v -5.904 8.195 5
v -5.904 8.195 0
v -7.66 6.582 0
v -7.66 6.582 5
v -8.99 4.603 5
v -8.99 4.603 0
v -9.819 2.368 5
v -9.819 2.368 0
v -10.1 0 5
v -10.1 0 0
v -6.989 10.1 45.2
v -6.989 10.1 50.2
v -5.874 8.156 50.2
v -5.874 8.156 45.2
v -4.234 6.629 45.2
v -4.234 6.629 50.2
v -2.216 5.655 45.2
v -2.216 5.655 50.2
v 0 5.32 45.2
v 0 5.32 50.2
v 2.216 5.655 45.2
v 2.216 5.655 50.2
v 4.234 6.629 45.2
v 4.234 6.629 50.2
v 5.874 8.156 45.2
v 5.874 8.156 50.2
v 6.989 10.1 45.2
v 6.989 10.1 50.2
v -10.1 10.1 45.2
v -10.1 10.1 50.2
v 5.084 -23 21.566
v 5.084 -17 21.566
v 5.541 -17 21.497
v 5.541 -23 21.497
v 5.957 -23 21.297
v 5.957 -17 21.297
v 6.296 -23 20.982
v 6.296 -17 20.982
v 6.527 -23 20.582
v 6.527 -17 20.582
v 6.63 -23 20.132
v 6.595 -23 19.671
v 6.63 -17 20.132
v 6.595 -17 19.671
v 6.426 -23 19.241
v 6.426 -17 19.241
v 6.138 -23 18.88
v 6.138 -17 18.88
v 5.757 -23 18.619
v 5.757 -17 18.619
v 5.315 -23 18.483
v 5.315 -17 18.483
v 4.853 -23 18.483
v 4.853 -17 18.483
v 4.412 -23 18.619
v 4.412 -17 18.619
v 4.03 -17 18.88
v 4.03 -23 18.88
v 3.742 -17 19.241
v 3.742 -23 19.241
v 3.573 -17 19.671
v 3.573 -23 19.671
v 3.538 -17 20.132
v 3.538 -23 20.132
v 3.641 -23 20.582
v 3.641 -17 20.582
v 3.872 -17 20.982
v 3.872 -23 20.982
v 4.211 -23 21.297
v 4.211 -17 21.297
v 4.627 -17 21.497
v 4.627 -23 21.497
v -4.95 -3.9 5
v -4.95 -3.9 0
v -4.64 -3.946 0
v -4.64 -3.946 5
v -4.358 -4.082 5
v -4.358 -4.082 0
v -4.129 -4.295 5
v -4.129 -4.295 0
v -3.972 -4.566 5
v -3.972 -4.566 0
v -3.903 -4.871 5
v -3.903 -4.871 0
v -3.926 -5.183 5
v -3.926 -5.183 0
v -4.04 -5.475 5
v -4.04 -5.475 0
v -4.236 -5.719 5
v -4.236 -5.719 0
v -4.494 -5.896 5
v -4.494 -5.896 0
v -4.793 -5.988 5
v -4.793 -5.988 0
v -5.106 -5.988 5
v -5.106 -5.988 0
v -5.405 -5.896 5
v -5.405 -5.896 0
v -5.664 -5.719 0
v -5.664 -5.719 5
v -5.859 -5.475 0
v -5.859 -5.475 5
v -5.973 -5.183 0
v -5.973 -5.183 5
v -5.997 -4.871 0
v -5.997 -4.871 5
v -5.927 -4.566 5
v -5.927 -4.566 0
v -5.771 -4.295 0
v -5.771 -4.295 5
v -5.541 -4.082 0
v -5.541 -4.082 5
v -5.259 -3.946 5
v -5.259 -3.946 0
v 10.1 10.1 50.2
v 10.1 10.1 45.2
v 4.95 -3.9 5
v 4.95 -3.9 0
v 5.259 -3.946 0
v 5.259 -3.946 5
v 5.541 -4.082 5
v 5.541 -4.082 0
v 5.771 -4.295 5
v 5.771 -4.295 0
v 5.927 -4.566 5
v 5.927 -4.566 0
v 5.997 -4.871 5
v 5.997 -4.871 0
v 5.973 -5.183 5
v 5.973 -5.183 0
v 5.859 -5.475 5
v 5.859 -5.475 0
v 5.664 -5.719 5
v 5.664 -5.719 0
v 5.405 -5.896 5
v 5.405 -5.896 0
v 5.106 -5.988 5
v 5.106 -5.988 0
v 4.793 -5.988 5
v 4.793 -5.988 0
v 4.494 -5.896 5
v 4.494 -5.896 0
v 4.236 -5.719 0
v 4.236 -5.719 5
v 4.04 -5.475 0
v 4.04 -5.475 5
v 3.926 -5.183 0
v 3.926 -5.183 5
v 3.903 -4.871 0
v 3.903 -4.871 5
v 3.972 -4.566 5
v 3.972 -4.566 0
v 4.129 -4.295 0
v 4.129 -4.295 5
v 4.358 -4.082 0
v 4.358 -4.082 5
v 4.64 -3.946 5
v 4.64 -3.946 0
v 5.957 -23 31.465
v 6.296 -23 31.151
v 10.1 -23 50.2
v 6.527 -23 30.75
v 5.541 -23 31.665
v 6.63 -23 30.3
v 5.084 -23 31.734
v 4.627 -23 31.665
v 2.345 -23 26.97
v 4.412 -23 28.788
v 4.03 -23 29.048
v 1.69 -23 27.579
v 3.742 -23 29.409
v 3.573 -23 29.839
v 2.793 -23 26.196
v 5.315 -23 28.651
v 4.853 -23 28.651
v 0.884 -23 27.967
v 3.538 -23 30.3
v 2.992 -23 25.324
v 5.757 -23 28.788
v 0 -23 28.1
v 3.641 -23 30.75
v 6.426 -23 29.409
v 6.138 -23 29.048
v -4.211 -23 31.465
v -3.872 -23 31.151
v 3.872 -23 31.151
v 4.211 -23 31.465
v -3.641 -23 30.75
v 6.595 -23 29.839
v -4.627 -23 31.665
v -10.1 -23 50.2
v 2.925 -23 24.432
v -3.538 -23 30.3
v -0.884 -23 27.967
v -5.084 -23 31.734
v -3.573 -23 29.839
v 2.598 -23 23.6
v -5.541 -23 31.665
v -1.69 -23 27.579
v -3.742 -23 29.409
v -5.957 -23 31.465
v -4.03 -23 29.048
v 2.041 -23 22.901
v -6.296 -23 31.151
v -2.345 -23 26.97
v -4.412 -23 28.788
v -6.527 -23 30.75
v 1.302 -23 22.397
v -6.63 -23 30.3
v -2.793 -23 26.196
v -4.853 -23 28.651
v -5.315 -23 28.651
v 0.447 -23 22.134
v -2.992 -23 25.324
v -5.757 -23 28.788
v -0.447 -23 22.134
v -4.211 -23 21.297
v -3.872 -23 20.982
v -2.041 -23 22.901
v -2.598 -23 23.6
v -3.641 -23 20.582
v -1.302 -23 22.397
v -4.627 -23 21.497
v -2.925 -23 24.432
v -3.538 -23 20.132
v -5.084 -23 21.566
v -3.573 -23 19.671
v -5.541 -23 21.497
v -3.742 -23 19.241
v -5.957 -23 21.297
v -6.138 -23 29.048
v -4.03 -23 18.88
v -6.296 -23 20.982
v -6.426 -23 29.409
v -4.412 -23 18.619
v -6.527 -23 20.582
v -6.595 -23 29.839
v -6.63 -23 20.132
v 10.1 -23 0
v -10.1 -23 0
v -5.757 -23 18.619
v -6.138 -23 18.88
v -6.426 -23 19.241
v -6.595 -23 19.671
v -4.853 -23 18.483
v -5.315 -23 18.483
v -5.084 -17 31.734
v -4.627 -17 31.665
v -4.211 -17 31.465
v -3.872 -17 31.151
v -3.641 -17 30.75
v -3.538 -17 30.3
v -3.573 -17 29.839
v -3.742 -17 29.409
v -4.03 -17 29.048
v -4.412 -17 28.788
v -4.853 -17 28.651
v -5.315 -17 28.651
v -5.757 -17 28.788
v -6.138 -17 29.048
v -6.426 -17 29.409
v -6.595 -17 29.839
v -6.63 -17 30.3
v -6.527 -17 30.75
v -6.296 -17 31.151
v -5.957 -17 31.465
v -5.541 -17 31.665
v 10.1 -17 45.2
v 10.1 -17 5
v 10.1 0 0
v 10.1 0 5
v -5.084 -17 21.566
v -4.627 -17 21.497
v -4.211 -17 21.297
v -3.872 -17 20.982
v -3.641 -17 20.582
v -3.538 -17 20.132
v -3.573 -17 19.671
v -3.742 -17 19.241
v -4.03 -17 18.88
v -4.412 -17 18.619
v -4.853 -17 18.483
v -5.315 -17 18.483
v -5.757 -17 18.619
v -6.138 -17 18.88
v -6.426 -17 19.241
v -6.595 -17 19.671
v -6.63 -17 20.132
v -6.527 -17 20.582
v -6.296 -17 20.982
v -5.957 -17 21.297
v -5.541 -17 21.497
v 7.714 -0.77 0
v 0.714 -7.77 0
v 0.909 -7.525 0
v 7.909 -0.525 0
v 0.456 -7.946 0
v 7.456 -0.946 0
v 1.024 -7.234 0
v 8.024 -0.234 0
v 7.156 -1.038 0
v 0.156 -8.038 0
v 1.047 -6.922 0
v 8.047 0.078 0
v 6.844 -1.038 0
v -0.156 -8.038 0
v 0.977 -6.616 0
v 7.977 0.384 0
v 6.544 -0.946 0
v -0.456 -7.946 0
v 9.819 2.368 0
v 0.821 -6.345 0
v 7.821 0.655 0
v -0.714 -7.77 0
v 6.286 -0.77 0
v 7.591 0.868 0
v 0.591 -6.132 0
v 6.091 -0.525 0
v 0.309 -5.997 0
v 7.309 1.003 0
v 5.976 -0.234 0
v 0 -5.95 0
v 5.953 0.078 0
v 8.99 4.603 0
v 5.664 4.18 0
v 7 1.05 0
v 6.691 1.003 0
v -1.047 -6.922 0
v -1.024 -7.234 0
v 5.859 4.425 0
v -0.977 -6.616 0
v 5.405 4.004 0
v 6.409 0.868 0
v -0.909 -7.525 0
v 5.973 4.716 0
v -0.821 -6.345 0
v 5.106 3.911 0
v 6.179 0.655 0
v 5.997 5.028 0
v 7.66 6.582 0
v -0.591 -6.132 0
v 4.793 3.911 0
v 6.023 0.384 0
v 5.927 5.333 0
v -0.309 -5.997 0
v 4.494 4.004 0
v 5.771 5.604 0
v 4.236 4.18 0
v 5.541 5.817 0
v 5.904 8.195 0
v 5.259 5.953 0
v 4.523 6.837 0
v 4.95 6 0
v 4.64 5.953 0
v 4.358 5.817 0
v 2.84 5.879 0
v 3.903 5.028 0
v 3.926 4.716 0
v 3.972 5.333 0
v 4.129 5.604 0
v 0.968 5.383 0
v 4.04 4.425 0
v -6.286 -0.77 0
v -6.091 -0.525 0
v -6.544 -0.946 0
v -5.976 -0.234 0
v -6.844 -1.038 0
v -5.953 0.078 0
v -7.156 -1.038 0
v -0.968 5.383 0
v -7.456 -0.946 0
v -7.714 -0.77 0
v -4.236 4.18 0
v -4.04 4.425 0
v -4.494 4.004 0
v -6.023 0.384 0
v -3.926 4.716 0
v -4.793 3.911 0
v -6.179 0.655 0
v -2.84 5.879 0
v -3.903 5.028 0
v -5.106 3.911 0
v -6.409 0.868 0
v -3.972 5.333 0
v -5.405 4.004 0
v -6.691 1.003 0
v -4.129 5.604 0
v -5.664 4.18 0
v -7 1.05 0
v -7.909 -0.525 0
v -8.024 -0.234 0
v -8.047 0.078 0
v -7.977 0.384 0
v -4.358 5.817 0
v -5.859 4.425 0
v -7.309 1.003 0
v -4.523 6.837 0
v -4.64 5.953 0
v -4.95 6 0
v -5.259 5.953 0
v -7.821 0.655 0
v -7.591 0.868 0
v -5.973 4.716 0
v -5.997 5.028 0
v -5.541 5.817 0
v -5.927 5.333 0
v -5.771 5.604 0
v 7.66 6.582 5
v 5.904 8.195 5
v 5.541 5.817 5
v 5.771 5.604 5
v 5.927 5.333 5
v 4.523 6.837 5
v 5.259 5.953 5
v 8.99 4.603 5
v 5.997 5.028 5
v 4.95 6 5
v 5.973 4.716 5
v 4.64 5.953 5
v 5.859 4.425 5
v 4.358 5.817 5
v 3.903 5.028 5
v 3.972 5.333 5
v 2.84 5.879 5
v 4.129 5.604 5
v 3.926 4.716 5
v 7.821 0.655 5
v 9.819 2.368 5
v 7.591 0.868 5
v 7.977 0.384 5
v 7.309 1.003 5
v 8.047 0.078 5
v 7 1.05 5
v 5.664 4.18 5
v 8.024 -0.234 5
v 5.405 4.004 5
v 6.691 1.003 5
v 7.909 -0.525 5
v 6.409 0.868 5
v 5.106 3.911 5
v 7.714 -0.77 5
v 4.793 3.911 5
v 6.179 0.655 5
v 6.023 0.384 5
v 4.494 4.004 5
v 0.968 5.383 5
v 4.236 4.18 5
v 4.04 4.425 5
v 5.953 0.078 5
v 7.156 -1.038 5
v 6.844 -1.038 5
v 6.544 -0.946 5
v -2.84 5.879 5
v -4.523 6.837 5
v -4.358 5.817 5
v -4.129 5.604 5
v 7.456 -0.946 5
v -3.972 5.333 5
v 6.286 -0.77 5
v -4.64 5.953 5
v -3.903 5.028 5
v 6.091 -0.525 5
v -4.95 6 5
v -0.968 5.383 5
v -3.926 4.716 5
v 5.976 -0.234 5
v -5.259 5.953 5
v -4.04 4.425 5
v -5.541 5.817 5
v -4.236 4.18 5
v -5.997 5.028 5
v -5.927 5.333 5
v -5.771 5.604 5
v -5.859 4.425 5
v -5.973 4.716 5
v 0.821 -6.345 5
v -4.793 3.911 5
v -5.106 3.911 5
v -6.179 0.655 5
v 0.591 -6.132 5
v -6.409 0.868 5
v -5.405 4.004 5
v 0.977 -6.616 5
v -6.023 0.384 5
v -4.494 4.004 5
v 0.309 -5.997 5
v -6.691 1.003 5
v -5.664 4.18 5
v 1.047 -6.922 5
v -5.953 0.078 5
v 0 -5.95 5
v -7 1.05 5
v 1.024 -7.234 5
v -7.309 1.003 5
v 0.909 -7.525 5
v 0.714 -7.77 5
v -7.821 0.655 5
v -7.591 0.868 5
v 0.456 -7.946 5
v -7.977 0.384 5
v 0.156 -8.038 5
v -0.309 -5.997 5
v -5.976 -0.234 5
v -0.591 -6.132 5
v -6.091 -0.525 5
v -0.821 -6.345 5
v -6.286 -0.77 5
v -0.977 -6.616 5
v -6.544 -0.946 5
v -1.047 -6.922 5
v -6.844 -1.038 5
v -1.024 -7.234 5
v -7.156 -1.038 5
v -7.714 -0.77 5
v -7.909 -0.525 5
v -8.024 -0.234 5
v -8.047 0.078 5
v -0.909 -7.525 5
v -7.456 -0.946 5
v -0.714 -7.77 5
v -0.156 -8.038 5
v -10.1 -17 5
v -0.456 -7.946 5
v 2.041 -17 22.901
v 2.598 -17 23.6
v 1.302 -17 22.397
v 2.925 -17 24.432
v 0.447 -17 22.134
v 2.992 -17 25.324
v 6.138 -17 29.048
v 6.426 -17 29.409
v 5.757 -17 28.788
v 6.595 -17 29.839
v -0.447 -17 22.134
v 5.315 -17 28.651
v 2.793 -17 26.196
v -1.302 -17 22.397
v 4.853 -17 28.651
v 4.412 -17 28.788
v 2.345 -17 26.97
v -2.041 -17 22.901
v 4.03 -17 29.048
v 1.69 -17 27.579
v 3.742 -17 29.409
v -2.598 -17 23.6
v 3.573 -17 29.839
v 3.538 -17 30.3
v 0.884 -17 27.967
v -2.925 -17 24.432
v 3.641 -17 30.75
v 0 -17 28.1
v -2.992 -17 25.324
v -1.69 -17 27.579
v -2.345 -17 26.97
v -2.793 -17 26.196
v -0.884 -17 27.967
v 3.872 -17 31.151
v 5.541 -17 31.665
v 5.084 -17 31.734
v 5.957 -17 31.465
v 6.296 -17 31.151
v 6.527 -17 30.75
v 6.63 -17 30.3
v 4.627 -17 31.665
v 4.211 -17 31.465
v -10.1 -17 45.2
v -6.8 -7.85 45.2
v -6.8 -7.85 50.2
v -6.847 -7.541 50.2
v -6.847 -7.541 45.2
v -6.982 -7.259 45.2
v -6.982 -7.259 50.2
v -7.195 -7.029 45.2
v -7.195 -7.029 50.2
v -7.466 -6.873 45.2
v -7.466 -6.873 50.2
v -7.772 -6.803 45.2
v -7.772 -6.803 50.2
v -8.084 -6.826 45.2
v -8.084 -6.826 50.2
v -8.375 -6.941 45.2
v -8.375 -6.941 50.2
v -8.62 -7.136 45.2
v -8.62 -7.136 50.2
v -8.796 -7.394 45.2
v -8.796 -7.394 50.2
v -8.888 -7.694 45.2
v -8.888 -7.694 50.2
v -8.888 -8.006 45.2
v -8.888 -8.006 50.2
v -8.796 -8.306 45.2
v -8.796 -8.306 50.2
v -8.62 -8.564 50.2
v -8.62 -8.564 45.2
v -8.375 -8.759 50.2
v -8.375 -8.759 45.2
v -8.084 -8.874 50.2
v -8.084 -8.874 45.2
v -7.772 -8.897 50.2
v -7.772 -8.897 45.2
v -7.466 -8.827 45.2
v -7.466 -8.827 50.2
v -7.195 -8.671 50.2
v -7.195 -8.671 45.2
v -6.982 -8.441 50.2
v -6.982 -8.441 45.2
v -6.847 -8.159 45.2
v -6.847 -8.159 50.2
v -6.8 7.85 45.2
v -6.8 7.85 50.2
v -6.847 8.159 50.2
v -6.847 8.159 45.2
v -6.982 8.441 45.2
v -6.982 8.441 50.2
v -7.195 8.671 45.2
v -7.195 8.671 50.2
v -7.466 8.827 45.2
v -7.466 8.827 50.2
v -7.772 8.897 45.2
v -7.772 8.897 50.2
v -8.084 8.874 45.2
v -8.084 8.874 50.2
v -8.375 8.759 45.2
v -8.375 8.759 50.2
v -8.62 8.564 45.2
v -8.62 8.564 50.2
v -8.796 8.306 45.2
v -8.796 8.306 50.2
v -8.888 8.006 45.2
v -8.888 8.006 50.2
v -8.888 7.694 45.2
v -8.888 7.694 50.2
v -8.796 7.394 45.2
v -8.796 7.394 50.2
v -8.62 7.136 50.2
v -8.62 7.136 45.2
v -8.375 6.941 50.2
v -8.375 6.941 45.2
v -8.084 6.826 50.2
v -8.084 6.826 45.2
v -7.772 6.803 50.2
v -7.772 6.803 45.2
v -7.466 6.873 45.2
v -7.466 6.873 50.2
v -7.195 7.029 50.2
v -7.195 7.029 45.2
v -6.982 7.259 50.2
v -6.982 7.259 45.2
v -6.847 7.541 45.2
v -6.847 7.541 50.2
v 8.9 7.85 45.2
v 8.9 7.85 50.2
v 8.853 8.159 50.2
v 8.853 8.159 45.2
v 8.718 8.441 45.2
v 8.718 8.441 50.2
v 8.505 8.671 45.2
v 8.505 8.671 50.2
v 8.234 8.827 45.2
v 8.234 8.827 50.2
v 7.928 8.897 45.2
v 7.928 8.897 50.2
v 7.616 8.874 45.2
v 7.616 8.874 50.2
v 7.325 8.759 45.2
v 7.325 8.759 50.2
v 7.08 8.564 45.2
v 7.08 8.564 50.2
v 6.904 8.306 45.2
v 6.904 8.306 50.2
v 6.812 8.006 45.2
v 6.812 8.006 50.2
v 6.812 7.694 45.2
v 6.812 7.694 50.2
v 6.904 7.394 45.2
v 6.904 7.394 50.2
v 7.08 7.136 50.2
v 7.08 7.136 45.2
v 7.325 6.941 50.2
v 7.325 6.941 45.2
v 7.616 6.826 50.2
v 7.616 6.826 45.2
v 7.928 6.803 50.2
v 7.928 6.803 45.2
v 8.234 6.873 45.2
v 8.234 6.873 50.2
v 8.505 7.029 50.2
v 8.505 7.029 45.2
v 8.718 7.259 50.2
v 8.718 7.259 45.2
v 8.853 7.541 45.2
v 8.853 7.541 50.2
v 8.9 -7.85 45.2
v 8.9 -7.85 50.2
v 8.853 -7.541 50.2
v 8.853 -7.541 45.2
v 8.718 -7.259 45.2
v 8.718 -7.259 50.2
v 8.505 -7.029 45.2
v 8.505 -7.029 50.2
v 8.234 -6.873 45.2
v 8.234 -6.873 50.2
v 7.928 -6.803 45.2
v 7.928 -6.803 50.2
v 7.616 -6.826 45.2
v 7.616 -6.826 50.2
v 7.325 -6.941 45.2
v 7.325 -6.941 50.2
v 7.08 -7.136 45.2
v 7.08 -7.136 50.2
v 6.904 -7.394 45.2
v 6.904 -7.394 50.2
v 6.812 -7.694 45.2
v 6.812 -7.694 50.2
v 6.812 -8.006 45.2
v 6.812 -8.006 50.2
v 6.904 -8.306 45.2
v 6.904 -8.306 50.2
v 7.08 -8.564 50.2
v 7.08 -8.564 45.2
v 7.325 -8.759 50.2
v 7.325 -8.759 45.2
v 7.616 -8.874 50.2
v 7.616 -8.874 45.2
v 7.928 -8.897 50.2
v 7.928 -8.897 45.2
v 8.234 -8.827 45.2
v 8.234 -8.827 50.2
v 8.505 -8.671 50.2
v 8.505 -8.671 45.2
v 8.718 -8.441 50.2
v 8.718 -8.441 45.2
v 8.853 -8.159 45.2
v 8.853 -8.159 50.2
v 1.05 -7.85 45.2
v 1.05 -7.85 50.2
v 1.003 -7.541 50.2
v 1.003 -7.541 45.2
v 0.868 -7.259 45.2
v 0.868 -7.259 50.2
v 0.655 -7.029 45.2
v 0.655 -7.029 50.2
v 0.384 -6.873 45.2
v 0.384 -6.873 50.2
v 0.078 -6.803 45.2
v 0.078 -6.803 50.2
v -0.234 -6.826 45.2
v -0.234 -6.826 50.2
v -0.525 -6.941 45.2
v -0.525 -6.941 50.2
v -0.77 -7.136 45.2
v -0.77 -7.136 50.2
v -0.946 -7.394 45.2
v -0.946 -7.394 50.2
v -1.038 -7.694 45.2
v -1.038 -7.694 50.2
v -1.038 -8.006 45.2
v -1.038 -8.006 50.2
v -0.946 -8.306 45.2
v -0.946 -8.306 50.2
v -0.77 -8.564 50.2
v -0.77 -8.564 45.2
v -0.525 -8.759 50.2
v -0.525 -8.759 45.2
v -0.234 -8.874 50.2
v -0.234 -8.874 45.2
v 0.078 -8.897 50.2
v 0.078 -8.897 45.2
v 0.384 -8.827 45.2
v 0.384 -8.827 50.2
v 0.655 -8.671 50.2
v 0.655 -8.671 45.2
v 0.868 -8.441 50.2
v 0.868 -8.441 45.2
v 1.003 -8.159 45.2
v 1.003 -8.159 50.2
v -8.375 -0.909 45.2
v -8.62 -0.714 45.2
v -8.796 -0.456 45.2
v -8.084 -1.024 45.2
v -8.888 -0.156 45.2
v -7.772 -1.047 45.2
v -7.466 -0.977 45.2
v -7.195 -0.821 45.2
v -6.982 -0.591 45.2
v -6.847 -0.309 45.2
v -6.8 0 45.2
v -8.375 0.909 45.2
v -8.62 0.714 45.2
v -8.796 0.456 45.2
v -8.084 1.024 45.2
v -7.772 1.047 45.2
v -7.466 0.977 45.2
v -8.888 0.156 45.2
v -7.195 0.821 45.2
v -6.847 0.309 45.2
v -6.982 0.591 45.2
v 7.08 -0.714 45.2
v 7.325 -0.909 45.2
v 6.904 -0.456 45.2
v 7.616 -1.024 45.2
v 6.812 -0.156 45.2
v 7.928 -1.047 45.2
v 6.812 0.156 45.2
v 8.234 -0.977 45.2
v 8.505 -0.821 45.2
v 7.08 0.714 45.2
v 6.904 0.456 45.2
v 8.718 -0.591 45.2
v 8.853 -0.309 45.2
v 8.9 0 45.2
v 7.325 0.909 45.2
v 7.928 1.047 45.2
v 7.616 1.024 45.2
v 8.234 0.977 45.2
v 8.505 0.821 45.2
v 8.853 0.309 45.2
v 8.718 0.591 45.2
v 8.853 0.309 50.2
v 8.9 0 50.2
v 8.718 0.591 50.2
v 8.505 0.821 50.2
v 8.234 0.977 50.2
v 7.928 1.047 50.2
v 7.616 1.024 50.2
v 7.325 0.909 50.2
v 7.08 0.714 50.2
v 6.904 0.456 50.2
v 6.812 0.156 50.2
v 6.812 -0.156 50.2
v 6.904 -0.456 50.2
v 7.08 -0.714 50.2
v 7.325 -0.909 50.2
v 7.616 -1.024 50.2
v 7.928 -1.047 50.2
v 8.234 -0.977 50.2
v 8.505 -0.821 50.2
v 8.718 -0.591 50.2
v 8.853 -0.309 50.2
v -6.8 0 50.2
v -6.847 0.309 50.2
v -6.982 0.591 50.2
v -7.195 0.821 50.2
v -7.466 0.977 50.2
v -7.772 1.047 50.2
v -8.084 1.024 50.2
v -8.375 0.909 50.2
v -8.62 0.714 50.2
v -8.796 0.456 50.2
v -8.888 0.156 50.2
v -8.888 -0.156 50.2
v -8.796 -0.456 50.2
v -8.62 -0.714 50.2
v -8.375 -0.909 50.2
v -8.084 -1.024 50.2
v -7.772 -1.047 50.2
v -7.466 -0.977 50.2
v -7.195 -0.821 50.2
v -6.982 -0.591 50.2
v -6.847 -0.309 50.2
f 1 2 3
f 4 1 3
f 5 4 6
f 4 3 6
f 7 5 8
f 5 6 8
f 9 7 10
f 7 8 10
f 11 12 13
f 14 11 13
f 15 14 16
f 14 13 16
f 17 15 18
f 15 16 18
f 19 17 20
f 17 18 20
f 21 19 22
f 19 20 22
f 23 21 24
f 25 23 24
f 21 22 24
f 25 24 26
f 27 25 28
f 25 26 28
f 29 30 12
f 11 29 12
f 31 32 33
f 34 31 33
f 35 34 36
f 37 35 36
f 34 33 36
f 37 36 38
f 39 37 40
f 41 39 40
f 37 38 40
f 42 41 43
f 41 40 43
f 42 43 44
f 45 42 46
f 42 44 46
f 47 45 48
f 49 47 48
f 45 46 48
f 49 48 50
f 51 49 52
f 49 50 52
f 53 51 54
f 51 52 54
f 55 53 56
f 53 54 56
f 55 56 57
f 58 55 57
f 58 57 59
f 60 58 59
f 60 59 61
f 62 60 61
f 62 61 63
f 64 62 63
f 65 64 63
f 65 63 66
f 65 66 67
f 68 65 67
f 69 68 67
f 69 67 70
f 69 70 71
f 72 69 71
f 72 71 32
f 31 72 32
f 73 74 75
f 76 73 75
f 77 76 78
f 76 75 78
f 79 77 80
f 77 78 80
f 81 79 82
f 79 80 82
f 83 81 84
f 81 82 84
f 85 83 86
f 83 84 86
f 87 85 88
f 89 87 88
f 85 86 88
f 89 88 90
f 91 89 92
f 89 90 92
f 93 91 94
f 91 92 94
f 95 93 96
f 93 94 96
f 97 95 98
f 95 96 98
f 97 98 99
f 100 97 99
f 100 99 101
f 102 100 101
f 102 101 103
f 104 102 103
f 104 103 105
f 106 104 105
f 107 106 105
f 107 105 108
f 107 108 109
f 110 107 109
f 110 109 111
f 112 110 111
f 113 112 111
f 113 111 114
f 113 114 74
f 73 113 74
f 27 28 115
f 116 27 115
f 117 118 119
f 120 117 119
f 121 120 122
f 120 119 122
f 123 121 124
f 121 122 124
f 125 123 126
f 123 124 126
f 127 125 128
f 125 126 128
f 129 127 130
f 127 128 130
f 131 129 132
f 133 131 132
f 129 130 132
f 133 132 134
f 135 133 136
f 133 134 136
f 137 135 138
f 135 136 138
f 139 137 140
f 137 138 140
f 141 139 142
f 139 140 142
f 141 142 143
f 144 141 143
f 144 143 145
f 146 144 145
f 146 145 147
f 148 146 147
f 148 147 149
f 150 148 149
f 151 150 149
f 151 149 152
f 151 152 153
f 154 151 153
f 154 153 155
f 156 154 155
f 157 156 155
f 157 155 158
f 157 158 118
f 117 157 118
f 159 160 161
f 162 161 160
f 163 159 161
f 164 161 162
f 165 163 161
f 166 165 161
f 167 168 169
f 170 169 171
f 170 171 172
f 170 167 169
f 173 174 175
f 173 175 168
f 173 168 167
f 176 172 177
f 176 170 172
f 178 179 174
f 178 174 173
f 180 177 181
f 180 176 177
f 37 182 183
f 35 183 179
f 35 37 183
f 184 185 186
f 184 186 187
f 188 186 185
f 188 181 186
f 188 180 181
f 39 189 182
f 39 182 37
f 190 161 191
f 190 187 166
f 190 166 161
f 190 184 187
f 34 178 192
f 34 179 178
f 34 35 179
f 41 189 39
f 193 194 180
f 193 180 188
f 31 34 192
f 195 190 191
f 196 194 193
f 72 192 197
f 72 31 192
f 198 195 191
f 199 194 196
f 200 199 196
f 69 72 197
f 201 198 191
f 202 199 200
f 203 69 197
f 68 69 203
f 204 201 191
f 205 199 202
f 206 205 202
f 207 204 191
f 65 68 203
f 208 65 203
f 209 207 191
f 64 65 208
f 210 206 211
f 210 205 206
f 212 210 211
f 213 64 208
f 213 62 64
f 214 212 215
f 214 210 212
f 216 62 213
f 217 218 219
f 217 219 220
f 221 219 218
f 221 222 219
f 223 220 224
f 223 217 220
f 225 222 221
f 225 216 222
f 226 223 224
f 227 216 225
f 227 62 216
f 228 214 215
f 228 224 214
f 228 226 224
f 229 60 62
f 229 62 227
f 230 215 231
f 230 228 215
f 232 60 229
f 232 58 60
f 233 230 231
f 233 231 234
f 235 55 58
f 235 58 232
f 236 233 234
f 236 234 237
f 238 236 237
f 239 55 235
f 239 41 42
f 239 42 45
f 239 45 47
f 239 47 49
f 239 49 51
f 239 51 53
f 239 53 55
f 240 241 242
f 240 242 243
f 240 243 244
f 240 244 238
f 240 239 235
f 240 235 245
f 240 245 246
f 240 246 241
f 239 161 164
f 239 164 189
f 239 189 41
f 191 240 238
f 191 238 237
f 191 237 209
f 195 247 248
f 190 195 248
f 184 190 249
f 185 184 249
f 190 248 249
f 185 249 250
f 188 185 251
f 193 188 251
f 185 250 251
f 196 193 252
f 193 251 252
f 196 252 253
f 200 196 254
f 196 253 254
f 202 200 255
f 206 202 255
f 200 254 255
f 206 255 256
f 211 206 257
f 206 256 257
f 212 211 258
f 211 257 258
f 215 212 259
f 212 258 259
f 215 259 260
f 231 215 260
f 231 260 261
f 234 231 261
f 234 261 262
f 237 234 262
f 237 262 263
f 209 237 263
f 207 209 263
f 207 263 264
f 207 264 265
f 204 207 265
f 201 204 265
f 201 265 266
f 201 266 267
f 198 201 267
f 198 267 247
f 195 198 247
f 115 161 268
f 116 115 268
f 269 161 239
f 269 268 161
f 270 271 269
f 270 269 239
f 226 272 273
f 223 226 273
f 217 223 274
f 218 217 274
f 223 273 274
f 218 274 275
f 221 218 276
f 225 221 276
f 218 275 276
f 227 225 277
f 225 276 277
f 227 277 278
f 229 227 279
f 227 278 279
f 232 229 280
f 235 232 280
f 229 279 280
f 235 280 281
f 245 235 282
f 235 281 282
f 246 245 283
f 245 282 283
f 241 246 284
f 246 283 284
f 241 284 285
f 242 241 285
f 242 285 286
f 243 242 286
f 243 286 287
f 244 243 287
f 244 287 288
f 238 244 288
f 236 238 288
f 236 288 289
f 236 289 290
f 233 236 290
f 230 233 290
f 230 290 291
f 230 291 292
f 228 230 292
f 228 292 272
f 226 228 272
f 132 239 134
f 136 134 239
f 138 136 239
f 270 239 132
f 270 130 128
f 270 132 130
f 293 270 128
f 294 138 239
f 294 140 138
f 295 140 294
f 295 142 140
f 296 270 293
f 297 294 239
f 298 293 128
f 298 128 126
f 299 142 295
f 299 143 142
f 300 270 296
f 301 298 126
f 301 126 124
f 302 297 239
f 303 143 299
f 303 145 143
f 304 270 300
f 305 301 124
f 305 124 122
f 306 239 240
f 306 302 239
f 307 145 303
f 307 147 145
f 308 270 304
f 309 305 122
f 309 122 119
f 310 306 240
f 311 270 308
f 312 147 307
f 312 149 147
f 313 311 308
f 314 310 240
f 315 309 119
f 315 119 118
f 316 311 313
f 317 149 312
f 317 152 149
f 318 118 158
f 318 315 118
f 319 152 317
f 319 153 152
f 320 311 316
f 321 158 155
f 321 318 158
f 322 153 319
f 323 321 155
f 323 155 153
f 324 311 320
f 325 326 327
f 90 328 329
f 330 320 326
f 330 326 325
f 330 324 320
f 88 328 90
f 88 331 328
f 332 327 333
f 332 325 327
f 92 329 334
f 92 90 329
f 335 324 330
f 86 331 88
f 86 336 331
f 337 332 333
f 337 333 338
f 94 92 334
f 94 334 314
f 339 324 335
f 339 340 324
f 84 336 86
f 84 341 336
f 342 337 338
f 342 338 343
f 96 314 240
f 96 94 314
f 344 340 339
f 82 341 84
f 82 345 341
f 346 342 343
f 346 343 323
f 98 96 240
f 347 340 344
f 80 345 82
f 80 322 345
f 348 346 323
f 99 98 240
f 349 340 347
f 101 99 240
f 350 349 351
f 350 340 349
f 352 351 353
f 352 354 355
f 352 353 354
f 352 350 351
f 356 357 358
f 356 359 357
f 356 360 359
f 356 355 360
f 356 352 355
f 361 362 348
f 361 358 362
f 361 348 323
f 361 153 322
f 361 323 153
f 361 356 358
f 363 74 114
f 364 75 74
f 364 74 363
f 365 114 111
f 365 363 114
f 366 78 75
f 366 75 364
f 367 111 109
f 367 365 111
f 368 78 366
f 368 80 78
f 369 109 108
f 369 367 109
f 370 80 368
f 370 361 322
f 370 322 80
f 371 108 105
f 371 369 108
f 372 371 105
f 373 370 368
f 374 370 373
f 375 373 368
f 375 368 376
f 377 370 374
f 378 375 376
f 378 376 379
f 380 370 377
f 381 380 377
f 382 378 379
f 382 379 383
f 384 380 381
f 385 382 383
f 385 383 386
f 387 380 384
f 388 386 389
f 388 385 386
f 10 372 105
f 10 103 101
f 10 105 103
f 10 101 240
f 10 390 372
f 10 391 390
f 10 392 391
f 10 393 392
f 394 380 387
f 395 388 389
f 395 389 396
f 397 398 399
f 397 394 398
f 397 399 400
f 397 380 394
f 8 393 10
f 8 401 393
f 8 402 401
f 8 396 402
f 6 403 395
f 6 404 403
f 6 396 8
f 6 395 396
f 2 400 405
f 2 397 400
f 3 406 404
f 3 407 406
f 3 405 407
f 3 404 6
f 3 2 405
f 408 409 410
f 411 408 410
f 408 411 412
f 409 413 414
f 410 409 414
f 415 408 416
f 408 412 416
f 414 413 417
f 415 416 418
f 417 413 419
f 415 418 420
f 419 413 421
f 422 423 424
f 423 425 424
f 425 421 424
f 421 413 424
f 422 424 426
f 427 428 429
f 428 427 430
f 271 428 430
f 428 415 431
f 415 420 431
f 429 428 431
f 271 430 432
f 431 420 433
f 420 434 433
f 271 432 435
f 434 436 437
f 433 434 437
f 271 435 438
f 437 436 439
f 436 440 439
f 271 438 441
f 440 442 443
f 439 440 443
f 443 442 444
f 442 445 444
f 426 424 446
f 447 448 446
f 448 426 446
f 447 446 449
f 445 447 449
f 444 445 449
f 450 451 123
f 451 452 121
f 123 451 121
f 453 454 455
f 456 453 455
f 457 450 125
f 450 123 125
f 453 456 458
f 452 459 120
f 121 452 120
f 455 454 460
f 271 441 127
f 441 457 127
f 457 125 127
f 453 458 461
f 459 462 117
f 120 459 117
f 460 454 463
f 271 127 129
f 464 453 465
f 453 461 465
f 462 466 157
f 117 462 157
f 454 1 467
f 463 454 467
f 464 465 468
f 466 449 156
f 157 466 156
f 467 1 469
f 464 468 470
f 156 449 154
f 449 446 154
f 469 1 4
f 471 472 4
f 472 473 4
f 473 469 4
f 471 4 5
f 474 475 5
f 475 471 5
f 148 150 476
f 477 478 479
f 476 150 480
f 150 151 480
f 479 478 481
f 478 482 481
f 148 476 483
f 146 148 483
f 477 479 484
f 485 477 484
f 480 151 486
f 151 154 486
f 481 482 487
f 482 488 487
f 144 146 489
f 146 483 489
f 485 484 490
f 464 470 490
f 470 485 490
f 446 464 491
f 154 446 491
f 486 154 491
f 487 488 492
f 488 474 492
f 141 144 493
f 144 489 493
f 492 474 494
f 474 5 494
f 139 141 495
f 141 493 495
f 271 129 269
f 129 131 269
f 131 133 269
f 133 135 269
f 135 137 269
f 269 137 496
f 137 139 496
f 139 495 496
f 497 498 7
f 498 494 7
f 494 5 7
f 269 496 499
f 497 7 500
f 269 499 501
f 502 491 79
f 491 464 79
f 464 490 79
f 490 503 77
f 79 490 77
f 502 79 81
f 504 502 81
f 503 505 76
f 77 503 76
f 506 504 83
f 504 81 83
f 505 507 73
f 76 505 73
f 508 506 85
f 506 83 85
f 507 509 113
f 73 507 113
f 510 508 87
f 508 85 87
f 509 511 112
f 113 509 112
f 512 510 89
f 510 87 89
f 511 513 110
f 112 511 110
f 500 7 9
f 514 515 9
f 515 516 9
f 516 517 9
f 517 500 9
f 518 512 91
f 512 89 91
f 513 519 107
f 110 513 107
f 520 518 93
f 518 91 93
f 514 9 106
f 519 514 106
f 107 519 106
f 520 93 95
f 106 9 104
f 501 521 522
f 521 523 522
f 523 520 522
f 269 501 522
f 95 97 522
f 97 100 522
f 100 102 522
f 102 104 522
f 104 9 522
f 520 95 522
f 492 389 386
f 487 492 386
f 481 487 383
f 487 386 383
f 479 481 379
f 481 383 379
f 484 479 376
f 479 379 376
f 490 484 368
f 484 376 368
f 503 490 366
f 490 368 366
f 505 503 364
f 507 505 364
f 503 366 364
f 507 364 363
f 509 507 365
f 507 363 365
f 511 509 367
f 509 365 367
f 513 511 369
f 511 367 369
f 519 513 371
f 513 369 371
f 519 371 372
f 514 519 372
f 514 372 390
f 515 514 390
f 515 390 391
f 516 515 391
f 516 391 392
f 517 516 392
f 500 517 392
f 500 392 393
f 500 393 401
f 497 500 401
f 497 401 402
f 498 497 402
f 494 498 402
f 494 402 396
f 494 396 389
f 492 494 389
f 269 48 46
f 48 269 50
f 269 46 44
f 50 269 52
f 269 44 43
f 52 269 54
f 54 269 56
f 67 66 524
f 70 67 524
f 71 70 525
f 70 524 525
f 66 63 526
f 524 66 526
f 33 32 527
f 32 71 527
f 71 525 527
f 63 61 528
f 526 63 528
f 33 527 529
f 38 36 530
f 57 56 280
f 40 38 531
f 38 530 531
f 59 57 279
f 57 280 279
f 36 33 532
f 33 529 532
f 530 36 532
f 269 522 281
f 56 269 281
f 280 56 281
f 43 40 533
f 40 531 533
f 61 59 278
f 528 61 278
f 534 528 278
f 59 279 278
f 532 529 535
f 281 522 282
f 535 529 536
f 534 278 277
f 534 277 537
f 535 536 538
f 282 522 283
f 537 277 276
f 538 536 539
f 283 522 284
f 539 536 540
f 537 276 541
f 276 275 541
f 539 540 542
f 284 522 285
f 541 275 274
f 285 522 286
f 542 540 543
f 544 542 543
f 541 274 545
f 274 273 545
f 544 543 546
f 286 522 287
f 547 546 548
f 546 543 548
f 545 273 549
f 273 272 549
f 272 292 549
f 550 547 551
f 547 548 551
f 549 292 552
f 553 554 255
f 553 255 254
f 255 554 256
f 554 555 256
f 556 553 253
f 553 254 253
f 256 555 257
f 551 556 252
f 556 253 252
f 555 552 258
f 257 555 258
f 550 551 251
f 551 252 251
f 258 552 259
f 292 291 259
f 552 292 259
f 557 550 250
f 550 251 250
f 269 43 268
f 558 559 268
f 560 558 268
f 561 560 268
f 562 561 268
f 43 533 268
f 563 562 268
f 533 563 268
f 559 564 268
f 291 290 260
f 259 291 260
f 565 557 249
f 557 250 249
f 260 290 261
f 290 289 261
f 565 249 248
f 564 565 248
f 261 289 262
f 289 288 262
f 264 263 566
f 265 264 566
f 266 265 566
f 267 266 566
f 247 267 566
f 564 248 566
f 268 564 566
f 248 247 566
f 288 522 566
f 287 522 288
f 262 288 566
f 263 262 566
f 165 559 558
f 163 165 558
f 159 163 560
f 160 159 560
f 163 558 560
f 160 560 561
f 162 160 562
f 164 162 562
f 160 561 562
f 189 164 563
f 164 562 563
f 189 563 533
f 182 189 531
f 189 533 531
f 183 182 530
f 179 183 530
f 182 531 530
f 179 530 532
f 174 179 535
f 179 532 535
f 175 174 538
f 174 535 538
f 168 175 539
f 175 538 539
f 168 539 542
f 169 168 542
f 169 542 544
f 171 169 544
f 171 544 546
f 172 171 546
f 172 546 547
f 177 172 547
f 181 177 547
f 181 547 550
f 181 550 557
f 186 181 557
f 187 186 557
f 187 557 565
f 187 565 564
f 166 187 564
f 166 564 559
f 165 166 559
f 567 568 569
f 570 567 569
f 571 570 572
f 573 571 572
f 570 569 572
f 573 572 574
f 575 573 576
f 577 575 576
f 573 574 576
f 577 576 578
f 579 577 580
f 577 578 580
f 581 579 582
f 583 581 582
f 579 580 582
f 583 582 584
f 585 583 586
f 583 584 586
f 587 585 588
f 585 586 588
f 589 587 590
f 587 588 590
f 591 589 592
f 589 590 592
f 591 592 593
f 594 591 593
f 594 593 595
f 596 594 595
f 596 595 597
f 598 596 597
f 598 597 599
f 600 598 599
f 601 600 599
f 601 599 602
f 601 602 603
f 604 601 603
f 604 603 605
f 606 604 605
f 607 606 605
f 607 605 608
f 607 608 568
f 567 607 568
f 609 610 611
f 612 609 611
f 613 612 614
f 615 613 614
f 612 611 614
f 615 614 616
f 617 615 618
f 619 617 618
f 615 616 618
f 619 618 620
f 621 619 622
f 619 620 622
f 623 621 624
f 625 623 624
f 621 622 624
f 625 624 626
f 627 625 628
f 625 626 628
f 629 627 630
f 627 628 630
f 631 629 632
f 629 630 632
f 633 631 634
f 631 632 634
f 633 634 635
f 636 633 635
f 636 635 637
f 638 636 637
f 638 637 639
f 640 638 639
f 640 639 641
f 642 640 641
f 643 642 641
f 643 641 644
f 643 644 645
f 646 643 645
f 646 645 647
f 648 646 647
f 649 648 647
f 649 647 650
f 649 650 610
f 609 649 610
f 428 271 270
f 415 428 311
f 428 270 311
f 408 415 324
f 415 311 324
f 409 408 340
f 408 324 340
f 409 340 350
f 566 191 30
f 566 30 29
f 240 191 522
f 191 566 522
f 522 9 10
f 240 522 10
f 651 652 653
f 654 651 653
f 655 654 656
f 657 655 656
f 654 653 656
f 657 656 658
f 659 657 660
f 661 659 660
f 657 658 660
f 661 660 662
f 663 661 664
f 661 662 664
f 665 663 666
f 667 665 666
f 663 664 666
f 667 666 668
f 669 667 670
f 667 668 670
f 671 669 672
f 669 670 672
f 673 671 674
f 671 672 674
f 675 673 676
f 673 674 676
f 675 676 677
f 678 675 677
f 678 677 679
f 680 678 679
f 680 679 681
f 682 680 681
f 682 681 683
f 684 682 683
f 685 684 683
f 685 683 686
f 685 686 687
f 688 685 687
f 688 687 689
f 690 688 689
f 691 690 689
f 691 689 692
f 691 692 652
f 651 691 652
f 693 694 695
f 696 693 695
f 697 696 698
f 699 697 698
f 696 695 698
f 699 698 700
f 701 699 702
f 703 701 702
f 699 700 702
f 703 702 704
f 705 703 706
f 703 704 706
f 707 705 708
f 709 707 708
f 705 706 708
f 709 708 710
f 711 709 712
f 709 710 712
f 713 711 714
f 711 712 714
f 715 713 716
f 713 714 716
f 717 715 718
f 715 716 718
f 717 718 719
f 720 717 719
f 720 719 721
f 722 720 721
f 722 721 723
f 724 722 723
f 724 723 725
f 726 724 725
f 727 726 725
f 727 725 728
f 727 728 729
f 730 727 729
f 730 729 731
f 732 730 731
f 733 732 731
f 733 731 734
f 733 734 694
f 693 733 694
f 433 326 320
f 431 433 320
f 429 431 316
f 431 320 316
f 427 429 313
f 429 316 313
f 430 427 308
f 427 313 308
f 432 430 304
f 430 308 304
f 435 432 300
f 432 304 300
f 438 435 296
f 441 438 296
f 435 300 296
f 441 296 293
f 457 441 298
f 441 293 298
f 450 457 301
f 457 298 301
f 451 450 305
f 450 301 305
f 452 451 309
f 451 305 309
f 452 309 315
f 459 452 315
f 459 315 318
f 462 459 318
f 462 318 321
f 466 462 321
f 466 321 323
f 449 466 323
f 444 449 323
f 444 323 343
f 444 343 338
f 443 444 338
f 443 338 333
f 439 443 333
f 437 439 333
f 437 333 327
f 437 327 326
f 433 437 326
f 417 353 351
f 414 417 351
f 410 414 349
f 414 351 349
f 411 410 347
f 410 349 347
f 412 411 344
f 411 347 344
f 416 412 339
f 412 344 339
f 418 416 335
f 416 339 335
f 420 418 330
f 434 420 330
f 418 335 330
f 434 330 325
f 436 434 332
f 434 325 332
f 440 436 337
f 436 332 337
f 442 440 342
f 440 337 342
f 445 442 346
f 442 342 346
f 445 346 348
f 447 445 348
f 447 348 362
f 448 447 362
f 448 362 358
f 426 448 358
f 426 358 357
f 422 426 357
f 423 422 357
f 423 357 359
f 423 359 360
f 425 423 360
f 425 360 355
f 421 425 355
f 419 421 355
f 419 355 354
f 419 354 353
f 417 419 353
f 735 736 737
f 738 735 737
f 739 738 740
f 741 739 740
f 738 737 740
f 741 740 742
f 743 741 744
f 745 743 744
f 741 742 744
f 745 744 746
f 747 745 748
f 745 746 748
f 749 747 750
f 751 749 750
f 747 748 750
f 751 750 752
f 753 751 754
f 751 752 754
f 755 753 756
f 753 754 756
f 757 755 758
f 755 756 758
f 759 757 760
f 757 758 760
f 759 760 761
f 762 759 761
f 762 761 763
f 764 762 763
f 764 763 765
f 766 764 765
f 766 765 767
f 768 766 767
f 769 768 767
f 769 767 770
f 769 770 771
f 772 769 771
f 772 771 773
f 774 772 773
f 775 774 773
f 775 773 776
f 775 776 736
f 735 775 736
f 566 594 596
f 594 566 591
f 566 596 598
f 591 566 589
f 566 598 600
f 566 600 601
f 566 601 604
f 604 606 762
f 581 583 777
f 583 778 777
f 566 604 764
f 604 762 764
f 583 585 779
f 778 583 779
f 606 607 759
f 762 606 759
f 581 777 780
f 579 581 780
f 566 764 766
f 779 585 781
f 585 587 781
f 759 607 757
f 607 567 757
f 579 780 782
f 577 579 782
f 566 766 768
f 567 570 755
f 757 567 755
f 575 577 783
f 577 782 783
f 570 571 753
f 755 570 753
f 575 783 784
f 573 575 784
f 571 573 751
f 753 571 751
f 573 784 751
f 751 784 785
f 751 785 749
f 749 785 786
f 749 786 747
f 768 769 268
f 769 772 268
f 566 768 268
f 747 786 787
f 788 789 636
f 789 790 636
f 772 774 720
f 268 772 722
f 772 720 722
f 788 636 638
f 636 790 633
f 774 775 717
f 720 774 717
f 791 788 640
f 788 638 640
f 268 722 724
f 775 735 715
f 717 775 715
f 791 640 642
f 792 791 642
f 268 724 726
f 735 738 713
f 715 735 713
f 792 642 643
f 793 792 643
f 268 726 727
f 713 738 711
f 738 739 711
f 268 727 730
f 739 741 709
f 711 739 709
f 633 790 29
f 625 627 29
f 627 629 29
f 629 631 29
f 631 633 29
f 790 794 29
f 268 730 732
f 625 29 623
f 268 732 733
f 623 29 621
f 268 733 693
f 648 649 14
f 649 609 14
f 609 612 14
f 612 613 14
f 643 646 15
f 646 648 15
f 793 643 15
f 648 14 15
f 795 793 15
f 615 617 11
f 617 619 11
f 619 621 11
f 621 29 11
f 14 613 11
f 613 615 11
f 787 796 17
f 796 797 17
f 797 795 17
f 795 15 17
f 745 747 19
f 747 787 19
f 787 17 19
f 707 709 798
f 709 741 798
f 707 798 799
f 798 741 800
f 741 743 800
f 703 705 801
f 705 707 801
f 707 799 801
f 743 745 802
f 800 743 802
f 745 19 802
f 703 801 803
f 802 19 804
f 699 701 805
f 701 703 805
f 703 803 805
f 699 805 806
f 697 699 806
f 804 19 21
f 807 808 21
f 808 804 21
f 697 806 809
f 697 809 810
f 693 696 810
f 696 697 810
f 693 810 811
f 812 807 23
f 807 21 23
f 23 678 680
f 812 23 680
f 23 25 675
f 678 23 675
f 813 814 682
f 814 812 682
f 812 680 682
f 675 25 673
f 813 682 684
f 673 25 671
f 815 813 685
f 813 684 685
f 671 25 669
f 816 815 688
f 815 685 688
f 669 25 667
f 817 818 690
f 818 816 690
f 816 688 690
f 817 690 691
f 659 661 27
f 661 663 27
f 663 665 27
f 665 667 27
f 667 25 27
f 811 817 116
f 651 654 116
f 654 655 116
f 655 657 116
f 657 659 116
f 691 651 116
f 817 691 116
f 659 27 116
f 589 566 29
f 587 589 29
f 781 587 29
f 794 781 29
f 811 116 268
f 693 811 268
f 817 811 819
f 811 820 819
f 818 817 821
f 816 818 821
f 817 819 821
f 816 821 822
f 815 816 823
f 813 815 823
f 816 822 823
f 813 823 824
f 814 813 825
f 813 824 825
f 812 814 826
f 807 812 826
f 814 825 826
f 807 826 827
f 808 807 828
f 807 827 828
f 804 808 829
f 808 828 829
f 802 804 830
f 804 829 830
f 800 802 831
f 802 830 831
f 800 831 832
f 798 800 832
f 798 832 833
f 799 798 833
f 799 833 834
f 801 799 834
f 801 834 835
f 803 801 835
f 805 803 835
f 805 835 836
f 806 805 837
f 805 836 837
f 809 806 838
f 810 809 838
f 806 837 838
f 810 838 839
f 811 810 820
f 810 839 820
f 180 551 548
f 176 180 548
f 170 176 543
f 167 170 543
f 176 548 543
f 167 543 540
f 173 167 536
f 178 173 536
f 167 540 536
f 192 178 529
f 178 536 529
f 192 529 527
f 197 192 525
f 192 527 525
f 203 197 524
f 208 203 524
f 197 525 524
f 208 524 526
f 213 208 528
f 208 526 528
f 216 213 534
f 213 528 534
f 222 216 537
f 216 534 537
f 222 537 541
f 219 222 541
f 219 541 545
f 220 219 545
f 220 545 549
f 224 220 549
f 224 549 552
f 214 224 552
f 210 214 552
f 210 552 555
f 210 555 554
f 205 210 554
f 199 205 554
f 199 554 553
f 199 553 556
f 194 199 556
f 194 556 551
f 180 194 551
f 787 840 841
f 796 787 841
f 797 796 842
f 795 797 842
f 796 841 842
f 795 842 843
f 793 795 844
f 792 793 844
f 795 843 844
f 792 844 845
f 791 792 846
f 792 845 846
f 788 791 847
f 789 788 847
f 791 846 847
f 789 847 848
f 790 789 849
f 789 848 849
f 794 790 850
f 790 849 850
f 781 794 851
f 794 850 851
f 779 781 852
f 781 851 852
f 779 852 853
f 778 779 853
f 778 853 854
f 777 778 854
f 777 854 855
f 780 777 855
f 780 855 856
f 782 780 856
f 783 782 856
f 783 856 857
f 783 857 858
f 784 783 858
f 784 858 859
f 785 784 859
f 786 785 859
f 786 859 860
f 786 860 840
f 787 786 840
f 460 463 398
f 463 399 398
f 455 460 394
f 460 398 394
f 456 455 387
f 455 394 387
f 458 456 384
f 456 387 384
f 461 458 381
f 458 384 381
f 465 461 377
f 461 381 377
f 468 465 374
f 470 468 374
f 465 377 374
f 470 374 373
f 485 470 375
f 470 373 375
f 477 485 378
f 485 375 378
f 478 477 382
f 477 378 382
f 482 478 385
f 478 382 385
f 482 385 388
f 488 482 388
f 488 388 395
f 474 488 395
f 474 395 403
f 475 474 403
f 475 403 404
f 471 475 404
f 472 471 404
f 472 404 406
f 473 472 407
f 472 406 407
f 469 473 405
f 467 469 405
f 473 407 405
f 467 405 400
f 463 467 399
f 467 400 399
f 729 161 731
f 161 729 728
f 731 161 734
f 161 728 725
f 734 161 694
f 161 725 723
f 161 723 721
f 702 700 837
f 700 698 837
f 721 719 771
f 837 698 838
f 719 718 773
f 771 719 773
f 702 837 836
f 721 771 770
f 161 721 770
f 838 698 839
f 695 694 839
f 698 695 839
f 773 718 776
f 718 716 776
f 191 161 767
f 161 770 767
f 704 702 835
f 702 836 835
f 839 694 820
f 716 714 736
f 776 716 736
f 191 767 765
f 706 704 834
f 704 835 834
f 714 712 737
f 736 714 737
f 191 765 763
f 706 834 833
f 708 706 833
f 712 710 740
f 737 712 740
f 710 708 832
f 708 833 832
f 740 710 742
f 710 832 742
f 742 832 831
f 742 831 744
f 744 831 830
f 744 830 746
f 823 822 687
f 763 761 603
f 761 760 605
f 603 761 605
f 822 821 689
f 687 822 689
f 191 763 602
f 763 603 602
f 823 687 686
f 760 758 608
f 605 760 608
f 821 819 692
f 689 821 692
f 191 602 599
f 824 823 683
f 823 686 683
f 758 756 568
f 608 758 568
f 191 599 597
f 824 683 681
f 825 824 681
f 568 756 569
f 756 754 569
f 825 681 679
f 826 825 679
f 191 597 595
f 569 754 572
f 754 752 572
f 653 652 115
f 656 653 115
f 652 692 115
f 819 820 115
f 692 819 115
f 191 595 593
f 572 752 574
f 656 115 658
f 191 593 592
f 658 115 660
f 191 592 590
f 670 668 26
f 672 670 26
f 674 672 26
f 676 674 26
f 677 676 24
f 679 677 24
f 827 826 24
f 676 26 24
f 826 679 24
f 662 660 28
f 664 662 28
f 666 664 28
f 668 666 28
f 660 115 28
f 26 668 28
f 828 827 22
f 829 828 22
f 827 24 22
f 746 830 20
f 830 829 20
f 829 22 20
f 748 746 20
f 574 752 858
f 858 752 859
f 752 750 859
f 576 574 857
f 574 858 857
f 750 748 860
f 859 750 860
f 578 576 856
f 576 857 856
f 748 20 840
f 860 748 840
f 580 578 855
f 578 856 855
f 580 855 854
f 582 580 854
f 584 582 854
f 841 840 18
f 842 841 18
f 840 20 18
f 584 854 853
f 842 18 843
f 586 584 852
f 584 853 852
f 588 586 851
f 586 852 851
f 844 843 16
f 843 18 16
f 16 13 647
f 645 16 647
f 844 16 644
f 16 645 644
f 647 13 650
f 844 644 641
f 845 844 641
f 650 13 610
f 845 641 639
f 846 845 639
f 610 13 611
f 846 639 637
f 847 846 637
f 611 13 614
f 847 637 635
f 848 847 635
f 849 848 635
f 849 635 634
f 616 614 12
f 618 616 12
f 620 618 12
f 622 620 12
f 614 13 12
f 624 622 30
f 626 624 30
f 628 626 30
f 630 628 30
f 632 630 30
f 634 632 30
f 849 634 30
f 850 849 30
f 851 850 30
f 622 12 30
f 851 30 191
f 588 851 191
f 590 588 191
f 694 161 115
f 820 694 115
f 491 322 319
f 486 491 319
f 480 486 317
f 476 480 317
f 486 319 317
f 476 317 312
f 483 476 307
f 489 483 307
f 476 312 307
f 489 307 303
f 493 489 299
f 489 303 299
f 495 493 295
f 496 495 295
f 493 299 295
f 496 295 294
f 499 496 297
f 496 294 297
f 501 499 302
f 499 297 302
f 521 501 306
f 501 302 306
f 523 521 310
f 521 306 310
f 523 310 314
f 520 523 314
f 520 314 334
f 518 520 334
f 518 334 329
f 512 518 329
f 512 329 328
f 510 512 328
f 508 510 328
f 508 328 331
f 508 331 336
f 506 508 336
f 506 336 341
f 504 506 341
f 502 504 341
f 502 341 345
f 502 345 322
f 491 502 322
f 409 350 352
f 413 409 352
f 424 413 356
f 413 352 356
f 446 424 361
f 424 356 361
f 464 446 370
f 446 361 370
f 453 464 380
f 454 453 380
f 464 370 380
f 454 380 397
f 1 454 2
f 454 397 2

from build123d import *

# Parameters (mm, degrees)
BOSS_EXTRUDE1_DEPTH = 50.2
CUT_EXTRUDE2_DEPTH  = 44.2
SKETCH3_W           = 20.2
SKETCH3_H           = 10.1
BOSS_EXTRUDE2_DEPTH = 5
SKETCH4_R           = 1.05
CUT_EXTRUDE3_DEPTH  = 11
SKETCH5_R           = 4
SKETCH5_R_2         = 7.5
CUT_EXTRUDE4_DEPTH  = 11
SKETCH6_R           = 4
BOSS_EXTRUDE3_DEPTH = 5
SKETCH7_R           = 4
SKETCH7_R_2         = 1.05
CUT_EXTRUDE5_DEPTH  = 16
SKETCH8_R           = 7.5
CUT_EXTRUDE6_DEPTH  = 11
SKETCH9_R           = 4
BOSS_EXTRUDE4_DEPTH = 5
SKETCH11_W          = 20.2
SKETCH11_H          = 50.2
BOSS_EXTRUDE5_DEPTH = 3
SKETCH12_R          = 3
SKETCH12_R_2        = 1.55
CUT_EXTRUDE8_DEPTH  = 23


with BuildPart() as part:
    # Sketch1 → Boss-Extrude1 (new body)
    with BuildSketch(Plane.XY):
        with BuildLine():
            Line((-10.1, 0), (-10.1, -20))
            Line((-10.1, -20), (10.1, -20))
            Line((10.1, -20), (10.1, 0))
            ThreePointArc((10.1, 0), (0, 10.1), (-10.1, 0))
        make_face()
    extrude(amount=BOSS_EXTRUDE1_DEPTH)

    # Sketch2 → Cut-Extrude2 (cut)
    with BuildSketch(Plane.ZY.offset(10.1)):
        Polygon((5, -10), (5, -17), (45.2, -17), (45.2, -10), (45.2, 11.866817026), (5, 11.866817026), align=None)
    extrude(amount=-CUT_EXTRUDE2_DEPTH, mode=Mode.SUBTRACT)

    # Sketch3 → Boss-Extrude2 (add)
    with BuildSketch(Plane.XY.offset(50.2)):
        with Locations((0, 5.05)):
            Rectangle(SKETCH3_W, SKETCH3_H)
    extrude(amount=-BOSS_EXTRUDE2_DEPTH)

    # Sketch4 → Cut-Extrude3 (cut, symmetric)
    with BuildSketch(Plane.XY.offset(50.2)):
        with Locations((-7.85, 7.85)):
            Circle(SKETCH4_R)
        with Locations((7.85, 7.85)):
            Circle(SKETCH4_R)
        with Locations((-7.85, -7.85)):
            Circle(SKETCH4_R)
        with Locations((7.85, -7.85)):
            Circle(SKETCH4_R)
        with Locations((0, 7.85)):
            Circle(SKETCH4_R)
        with Locations((0, -7.85)):
            Circle(SKETCH4_R)
        with Locations((-7.85, 0)):
            Circle(SKETCH4_R)
        with Locations((7.85, 0)):
            Circle(SKETCH4_R)
    extrude(amount=CUT_EXTRUDE3_DEPTH, both=True, mode=Mode.SUBTRACT)

    # Sketch5 → Cut-Extrude4 (cut, symmetric)
    with BuildSketch(Plane.XY.offset(50.2)):
        Circle(SKETCH5_R)
        with Locations((0, 12.82)):
            Circle(SKETCH5_R_2)
    extrude(amount=CUT_EXTRUDE4_DEPTH, both=True, mode=Mode.SUBTRACT)

    # Sketch6 → Boss-Extrude3 (add)
    with BuildSketch(Plane.XY.offset(50.2)):
        Circle(SKETCH6_R)
    extrude(amount=-BOSS_EXTRUDE3_DEPTH)

    # Sketch7 → Cut-Extrude5 (cut, symmetric)
    with BuildSketch(Plane(origin=(0, 0, 0), x_dir=(-1, 0, 0), z_dir=(0, 0, -1))):
        with Locations(Location((0, 0, 0), (0, 0, 90))):
            Circle(SKETCH7_R)
        with Locations(Location((0, 7, 0), (0, 0, 90))):
            Circle(SKETCH7_R_2)
        with Locations(Location((-4.949747468, 4.949747468, 0), (0, 0, 90))):
            Circle(SKETCH7_R_2)
        with Locations(Location((-7, 0, 0), (0, 0, 90))):
            Circle(SKETCH7_R_2)
        with Locations(Location((-4.949747468, -4.949747468, 0), (0, 0, 90))):
            Circle(SKETCH7_R_2)
        with Locations(Location((0, -7, 0), (0, 0, 90))):
            Circle(SKETCH7_R_2)
        with Locations(Location((4.949747468, -4.949747468, 0), (0, 0, 90))):
            Circle(SKETCH7_R_2)
        with Locations(Location((7, 0, 0), (0, 0, 90))):
            Circle(SKETCH7_R_2)
        with Locations(Location((4.949747468, 4.949747468, 0), (0, 0, 90))):
            Circle(SKETCH7_R_2)
    extrude(amount=CUT_EXTRUDE5_DEPTH, both=True, mode=Mode.SUBTRACT)

    # Sketch8 → Cut-Extrude6 (cut, symmetric)
    with BuildSketch(Plane(origin=(0, 0, 0), x_dir=(-1, 0, 0), z_dir=(0, 0, -1))):
        with Locations((0, 12.82)):
            Circle(SKETCH8_R)
    extrude(amount=CUT_EXTRUDE6_DEPTH, both=True, mode=Mode.SUBTRACT)

    # Sketch9 → Boss-Extrude4 (add)
    with BuildSketch(Plane(origin=(0, 0, 0), x_dir=(-1, 0, 0), z_dir=(0, 0, -1))):
        Circle(SKETCH9_R)
    extrude(amount=-BOSS_EXTRUDE4_DEPTH)

    # Sketch11 → Boss-Extrude5 (add)
    with BuildSketch(Plane(origin=(0, -20, 0), x_dir=(-1, 0, 0), z_dir=(0, -1, 0))):
        with Locations((0, -25.1)):
            Rectangle(SKETCH11_W, SKETCH11_H)
    extrude(amount=BOSS_EXTRUDE5_DEPTH)

    # Sketch12 → Cut-Extrude8 (cut)
    with BuildSketch(Plane(origin=(0, -17, 0), x_dir=(1, 0, 0), z_dir=(0, 1, 0))):
        with Locations(Location((0, -25.1, 0), (0, 0, 270))):
            Circle(SKETCH12_R)
        with Locations(Location((-5.084097757, -20.015902243, 0), (0, 0, 270))):
            Circle(SKETCH12_R_2)
        with Locations(Location((5.084097757, -20.015902243, 0), (0, 0, 270))):
            Circle(SKETCH12_R_2)
        with Locations(Location((5.084097757, -30.184097757, 0), (0, 0, 270))):
            Circle(SKETCH12_R_2)
        with Locations(Location((-5.084097757, -30.184097757, 0), (0, 0, 270))):
            Circle(SKETCH12_R_2)
    extrude(amount=-CUT_EXTRUDE8_DEPTH, mode=Mode.SUBTRACT)


solid = part.part
